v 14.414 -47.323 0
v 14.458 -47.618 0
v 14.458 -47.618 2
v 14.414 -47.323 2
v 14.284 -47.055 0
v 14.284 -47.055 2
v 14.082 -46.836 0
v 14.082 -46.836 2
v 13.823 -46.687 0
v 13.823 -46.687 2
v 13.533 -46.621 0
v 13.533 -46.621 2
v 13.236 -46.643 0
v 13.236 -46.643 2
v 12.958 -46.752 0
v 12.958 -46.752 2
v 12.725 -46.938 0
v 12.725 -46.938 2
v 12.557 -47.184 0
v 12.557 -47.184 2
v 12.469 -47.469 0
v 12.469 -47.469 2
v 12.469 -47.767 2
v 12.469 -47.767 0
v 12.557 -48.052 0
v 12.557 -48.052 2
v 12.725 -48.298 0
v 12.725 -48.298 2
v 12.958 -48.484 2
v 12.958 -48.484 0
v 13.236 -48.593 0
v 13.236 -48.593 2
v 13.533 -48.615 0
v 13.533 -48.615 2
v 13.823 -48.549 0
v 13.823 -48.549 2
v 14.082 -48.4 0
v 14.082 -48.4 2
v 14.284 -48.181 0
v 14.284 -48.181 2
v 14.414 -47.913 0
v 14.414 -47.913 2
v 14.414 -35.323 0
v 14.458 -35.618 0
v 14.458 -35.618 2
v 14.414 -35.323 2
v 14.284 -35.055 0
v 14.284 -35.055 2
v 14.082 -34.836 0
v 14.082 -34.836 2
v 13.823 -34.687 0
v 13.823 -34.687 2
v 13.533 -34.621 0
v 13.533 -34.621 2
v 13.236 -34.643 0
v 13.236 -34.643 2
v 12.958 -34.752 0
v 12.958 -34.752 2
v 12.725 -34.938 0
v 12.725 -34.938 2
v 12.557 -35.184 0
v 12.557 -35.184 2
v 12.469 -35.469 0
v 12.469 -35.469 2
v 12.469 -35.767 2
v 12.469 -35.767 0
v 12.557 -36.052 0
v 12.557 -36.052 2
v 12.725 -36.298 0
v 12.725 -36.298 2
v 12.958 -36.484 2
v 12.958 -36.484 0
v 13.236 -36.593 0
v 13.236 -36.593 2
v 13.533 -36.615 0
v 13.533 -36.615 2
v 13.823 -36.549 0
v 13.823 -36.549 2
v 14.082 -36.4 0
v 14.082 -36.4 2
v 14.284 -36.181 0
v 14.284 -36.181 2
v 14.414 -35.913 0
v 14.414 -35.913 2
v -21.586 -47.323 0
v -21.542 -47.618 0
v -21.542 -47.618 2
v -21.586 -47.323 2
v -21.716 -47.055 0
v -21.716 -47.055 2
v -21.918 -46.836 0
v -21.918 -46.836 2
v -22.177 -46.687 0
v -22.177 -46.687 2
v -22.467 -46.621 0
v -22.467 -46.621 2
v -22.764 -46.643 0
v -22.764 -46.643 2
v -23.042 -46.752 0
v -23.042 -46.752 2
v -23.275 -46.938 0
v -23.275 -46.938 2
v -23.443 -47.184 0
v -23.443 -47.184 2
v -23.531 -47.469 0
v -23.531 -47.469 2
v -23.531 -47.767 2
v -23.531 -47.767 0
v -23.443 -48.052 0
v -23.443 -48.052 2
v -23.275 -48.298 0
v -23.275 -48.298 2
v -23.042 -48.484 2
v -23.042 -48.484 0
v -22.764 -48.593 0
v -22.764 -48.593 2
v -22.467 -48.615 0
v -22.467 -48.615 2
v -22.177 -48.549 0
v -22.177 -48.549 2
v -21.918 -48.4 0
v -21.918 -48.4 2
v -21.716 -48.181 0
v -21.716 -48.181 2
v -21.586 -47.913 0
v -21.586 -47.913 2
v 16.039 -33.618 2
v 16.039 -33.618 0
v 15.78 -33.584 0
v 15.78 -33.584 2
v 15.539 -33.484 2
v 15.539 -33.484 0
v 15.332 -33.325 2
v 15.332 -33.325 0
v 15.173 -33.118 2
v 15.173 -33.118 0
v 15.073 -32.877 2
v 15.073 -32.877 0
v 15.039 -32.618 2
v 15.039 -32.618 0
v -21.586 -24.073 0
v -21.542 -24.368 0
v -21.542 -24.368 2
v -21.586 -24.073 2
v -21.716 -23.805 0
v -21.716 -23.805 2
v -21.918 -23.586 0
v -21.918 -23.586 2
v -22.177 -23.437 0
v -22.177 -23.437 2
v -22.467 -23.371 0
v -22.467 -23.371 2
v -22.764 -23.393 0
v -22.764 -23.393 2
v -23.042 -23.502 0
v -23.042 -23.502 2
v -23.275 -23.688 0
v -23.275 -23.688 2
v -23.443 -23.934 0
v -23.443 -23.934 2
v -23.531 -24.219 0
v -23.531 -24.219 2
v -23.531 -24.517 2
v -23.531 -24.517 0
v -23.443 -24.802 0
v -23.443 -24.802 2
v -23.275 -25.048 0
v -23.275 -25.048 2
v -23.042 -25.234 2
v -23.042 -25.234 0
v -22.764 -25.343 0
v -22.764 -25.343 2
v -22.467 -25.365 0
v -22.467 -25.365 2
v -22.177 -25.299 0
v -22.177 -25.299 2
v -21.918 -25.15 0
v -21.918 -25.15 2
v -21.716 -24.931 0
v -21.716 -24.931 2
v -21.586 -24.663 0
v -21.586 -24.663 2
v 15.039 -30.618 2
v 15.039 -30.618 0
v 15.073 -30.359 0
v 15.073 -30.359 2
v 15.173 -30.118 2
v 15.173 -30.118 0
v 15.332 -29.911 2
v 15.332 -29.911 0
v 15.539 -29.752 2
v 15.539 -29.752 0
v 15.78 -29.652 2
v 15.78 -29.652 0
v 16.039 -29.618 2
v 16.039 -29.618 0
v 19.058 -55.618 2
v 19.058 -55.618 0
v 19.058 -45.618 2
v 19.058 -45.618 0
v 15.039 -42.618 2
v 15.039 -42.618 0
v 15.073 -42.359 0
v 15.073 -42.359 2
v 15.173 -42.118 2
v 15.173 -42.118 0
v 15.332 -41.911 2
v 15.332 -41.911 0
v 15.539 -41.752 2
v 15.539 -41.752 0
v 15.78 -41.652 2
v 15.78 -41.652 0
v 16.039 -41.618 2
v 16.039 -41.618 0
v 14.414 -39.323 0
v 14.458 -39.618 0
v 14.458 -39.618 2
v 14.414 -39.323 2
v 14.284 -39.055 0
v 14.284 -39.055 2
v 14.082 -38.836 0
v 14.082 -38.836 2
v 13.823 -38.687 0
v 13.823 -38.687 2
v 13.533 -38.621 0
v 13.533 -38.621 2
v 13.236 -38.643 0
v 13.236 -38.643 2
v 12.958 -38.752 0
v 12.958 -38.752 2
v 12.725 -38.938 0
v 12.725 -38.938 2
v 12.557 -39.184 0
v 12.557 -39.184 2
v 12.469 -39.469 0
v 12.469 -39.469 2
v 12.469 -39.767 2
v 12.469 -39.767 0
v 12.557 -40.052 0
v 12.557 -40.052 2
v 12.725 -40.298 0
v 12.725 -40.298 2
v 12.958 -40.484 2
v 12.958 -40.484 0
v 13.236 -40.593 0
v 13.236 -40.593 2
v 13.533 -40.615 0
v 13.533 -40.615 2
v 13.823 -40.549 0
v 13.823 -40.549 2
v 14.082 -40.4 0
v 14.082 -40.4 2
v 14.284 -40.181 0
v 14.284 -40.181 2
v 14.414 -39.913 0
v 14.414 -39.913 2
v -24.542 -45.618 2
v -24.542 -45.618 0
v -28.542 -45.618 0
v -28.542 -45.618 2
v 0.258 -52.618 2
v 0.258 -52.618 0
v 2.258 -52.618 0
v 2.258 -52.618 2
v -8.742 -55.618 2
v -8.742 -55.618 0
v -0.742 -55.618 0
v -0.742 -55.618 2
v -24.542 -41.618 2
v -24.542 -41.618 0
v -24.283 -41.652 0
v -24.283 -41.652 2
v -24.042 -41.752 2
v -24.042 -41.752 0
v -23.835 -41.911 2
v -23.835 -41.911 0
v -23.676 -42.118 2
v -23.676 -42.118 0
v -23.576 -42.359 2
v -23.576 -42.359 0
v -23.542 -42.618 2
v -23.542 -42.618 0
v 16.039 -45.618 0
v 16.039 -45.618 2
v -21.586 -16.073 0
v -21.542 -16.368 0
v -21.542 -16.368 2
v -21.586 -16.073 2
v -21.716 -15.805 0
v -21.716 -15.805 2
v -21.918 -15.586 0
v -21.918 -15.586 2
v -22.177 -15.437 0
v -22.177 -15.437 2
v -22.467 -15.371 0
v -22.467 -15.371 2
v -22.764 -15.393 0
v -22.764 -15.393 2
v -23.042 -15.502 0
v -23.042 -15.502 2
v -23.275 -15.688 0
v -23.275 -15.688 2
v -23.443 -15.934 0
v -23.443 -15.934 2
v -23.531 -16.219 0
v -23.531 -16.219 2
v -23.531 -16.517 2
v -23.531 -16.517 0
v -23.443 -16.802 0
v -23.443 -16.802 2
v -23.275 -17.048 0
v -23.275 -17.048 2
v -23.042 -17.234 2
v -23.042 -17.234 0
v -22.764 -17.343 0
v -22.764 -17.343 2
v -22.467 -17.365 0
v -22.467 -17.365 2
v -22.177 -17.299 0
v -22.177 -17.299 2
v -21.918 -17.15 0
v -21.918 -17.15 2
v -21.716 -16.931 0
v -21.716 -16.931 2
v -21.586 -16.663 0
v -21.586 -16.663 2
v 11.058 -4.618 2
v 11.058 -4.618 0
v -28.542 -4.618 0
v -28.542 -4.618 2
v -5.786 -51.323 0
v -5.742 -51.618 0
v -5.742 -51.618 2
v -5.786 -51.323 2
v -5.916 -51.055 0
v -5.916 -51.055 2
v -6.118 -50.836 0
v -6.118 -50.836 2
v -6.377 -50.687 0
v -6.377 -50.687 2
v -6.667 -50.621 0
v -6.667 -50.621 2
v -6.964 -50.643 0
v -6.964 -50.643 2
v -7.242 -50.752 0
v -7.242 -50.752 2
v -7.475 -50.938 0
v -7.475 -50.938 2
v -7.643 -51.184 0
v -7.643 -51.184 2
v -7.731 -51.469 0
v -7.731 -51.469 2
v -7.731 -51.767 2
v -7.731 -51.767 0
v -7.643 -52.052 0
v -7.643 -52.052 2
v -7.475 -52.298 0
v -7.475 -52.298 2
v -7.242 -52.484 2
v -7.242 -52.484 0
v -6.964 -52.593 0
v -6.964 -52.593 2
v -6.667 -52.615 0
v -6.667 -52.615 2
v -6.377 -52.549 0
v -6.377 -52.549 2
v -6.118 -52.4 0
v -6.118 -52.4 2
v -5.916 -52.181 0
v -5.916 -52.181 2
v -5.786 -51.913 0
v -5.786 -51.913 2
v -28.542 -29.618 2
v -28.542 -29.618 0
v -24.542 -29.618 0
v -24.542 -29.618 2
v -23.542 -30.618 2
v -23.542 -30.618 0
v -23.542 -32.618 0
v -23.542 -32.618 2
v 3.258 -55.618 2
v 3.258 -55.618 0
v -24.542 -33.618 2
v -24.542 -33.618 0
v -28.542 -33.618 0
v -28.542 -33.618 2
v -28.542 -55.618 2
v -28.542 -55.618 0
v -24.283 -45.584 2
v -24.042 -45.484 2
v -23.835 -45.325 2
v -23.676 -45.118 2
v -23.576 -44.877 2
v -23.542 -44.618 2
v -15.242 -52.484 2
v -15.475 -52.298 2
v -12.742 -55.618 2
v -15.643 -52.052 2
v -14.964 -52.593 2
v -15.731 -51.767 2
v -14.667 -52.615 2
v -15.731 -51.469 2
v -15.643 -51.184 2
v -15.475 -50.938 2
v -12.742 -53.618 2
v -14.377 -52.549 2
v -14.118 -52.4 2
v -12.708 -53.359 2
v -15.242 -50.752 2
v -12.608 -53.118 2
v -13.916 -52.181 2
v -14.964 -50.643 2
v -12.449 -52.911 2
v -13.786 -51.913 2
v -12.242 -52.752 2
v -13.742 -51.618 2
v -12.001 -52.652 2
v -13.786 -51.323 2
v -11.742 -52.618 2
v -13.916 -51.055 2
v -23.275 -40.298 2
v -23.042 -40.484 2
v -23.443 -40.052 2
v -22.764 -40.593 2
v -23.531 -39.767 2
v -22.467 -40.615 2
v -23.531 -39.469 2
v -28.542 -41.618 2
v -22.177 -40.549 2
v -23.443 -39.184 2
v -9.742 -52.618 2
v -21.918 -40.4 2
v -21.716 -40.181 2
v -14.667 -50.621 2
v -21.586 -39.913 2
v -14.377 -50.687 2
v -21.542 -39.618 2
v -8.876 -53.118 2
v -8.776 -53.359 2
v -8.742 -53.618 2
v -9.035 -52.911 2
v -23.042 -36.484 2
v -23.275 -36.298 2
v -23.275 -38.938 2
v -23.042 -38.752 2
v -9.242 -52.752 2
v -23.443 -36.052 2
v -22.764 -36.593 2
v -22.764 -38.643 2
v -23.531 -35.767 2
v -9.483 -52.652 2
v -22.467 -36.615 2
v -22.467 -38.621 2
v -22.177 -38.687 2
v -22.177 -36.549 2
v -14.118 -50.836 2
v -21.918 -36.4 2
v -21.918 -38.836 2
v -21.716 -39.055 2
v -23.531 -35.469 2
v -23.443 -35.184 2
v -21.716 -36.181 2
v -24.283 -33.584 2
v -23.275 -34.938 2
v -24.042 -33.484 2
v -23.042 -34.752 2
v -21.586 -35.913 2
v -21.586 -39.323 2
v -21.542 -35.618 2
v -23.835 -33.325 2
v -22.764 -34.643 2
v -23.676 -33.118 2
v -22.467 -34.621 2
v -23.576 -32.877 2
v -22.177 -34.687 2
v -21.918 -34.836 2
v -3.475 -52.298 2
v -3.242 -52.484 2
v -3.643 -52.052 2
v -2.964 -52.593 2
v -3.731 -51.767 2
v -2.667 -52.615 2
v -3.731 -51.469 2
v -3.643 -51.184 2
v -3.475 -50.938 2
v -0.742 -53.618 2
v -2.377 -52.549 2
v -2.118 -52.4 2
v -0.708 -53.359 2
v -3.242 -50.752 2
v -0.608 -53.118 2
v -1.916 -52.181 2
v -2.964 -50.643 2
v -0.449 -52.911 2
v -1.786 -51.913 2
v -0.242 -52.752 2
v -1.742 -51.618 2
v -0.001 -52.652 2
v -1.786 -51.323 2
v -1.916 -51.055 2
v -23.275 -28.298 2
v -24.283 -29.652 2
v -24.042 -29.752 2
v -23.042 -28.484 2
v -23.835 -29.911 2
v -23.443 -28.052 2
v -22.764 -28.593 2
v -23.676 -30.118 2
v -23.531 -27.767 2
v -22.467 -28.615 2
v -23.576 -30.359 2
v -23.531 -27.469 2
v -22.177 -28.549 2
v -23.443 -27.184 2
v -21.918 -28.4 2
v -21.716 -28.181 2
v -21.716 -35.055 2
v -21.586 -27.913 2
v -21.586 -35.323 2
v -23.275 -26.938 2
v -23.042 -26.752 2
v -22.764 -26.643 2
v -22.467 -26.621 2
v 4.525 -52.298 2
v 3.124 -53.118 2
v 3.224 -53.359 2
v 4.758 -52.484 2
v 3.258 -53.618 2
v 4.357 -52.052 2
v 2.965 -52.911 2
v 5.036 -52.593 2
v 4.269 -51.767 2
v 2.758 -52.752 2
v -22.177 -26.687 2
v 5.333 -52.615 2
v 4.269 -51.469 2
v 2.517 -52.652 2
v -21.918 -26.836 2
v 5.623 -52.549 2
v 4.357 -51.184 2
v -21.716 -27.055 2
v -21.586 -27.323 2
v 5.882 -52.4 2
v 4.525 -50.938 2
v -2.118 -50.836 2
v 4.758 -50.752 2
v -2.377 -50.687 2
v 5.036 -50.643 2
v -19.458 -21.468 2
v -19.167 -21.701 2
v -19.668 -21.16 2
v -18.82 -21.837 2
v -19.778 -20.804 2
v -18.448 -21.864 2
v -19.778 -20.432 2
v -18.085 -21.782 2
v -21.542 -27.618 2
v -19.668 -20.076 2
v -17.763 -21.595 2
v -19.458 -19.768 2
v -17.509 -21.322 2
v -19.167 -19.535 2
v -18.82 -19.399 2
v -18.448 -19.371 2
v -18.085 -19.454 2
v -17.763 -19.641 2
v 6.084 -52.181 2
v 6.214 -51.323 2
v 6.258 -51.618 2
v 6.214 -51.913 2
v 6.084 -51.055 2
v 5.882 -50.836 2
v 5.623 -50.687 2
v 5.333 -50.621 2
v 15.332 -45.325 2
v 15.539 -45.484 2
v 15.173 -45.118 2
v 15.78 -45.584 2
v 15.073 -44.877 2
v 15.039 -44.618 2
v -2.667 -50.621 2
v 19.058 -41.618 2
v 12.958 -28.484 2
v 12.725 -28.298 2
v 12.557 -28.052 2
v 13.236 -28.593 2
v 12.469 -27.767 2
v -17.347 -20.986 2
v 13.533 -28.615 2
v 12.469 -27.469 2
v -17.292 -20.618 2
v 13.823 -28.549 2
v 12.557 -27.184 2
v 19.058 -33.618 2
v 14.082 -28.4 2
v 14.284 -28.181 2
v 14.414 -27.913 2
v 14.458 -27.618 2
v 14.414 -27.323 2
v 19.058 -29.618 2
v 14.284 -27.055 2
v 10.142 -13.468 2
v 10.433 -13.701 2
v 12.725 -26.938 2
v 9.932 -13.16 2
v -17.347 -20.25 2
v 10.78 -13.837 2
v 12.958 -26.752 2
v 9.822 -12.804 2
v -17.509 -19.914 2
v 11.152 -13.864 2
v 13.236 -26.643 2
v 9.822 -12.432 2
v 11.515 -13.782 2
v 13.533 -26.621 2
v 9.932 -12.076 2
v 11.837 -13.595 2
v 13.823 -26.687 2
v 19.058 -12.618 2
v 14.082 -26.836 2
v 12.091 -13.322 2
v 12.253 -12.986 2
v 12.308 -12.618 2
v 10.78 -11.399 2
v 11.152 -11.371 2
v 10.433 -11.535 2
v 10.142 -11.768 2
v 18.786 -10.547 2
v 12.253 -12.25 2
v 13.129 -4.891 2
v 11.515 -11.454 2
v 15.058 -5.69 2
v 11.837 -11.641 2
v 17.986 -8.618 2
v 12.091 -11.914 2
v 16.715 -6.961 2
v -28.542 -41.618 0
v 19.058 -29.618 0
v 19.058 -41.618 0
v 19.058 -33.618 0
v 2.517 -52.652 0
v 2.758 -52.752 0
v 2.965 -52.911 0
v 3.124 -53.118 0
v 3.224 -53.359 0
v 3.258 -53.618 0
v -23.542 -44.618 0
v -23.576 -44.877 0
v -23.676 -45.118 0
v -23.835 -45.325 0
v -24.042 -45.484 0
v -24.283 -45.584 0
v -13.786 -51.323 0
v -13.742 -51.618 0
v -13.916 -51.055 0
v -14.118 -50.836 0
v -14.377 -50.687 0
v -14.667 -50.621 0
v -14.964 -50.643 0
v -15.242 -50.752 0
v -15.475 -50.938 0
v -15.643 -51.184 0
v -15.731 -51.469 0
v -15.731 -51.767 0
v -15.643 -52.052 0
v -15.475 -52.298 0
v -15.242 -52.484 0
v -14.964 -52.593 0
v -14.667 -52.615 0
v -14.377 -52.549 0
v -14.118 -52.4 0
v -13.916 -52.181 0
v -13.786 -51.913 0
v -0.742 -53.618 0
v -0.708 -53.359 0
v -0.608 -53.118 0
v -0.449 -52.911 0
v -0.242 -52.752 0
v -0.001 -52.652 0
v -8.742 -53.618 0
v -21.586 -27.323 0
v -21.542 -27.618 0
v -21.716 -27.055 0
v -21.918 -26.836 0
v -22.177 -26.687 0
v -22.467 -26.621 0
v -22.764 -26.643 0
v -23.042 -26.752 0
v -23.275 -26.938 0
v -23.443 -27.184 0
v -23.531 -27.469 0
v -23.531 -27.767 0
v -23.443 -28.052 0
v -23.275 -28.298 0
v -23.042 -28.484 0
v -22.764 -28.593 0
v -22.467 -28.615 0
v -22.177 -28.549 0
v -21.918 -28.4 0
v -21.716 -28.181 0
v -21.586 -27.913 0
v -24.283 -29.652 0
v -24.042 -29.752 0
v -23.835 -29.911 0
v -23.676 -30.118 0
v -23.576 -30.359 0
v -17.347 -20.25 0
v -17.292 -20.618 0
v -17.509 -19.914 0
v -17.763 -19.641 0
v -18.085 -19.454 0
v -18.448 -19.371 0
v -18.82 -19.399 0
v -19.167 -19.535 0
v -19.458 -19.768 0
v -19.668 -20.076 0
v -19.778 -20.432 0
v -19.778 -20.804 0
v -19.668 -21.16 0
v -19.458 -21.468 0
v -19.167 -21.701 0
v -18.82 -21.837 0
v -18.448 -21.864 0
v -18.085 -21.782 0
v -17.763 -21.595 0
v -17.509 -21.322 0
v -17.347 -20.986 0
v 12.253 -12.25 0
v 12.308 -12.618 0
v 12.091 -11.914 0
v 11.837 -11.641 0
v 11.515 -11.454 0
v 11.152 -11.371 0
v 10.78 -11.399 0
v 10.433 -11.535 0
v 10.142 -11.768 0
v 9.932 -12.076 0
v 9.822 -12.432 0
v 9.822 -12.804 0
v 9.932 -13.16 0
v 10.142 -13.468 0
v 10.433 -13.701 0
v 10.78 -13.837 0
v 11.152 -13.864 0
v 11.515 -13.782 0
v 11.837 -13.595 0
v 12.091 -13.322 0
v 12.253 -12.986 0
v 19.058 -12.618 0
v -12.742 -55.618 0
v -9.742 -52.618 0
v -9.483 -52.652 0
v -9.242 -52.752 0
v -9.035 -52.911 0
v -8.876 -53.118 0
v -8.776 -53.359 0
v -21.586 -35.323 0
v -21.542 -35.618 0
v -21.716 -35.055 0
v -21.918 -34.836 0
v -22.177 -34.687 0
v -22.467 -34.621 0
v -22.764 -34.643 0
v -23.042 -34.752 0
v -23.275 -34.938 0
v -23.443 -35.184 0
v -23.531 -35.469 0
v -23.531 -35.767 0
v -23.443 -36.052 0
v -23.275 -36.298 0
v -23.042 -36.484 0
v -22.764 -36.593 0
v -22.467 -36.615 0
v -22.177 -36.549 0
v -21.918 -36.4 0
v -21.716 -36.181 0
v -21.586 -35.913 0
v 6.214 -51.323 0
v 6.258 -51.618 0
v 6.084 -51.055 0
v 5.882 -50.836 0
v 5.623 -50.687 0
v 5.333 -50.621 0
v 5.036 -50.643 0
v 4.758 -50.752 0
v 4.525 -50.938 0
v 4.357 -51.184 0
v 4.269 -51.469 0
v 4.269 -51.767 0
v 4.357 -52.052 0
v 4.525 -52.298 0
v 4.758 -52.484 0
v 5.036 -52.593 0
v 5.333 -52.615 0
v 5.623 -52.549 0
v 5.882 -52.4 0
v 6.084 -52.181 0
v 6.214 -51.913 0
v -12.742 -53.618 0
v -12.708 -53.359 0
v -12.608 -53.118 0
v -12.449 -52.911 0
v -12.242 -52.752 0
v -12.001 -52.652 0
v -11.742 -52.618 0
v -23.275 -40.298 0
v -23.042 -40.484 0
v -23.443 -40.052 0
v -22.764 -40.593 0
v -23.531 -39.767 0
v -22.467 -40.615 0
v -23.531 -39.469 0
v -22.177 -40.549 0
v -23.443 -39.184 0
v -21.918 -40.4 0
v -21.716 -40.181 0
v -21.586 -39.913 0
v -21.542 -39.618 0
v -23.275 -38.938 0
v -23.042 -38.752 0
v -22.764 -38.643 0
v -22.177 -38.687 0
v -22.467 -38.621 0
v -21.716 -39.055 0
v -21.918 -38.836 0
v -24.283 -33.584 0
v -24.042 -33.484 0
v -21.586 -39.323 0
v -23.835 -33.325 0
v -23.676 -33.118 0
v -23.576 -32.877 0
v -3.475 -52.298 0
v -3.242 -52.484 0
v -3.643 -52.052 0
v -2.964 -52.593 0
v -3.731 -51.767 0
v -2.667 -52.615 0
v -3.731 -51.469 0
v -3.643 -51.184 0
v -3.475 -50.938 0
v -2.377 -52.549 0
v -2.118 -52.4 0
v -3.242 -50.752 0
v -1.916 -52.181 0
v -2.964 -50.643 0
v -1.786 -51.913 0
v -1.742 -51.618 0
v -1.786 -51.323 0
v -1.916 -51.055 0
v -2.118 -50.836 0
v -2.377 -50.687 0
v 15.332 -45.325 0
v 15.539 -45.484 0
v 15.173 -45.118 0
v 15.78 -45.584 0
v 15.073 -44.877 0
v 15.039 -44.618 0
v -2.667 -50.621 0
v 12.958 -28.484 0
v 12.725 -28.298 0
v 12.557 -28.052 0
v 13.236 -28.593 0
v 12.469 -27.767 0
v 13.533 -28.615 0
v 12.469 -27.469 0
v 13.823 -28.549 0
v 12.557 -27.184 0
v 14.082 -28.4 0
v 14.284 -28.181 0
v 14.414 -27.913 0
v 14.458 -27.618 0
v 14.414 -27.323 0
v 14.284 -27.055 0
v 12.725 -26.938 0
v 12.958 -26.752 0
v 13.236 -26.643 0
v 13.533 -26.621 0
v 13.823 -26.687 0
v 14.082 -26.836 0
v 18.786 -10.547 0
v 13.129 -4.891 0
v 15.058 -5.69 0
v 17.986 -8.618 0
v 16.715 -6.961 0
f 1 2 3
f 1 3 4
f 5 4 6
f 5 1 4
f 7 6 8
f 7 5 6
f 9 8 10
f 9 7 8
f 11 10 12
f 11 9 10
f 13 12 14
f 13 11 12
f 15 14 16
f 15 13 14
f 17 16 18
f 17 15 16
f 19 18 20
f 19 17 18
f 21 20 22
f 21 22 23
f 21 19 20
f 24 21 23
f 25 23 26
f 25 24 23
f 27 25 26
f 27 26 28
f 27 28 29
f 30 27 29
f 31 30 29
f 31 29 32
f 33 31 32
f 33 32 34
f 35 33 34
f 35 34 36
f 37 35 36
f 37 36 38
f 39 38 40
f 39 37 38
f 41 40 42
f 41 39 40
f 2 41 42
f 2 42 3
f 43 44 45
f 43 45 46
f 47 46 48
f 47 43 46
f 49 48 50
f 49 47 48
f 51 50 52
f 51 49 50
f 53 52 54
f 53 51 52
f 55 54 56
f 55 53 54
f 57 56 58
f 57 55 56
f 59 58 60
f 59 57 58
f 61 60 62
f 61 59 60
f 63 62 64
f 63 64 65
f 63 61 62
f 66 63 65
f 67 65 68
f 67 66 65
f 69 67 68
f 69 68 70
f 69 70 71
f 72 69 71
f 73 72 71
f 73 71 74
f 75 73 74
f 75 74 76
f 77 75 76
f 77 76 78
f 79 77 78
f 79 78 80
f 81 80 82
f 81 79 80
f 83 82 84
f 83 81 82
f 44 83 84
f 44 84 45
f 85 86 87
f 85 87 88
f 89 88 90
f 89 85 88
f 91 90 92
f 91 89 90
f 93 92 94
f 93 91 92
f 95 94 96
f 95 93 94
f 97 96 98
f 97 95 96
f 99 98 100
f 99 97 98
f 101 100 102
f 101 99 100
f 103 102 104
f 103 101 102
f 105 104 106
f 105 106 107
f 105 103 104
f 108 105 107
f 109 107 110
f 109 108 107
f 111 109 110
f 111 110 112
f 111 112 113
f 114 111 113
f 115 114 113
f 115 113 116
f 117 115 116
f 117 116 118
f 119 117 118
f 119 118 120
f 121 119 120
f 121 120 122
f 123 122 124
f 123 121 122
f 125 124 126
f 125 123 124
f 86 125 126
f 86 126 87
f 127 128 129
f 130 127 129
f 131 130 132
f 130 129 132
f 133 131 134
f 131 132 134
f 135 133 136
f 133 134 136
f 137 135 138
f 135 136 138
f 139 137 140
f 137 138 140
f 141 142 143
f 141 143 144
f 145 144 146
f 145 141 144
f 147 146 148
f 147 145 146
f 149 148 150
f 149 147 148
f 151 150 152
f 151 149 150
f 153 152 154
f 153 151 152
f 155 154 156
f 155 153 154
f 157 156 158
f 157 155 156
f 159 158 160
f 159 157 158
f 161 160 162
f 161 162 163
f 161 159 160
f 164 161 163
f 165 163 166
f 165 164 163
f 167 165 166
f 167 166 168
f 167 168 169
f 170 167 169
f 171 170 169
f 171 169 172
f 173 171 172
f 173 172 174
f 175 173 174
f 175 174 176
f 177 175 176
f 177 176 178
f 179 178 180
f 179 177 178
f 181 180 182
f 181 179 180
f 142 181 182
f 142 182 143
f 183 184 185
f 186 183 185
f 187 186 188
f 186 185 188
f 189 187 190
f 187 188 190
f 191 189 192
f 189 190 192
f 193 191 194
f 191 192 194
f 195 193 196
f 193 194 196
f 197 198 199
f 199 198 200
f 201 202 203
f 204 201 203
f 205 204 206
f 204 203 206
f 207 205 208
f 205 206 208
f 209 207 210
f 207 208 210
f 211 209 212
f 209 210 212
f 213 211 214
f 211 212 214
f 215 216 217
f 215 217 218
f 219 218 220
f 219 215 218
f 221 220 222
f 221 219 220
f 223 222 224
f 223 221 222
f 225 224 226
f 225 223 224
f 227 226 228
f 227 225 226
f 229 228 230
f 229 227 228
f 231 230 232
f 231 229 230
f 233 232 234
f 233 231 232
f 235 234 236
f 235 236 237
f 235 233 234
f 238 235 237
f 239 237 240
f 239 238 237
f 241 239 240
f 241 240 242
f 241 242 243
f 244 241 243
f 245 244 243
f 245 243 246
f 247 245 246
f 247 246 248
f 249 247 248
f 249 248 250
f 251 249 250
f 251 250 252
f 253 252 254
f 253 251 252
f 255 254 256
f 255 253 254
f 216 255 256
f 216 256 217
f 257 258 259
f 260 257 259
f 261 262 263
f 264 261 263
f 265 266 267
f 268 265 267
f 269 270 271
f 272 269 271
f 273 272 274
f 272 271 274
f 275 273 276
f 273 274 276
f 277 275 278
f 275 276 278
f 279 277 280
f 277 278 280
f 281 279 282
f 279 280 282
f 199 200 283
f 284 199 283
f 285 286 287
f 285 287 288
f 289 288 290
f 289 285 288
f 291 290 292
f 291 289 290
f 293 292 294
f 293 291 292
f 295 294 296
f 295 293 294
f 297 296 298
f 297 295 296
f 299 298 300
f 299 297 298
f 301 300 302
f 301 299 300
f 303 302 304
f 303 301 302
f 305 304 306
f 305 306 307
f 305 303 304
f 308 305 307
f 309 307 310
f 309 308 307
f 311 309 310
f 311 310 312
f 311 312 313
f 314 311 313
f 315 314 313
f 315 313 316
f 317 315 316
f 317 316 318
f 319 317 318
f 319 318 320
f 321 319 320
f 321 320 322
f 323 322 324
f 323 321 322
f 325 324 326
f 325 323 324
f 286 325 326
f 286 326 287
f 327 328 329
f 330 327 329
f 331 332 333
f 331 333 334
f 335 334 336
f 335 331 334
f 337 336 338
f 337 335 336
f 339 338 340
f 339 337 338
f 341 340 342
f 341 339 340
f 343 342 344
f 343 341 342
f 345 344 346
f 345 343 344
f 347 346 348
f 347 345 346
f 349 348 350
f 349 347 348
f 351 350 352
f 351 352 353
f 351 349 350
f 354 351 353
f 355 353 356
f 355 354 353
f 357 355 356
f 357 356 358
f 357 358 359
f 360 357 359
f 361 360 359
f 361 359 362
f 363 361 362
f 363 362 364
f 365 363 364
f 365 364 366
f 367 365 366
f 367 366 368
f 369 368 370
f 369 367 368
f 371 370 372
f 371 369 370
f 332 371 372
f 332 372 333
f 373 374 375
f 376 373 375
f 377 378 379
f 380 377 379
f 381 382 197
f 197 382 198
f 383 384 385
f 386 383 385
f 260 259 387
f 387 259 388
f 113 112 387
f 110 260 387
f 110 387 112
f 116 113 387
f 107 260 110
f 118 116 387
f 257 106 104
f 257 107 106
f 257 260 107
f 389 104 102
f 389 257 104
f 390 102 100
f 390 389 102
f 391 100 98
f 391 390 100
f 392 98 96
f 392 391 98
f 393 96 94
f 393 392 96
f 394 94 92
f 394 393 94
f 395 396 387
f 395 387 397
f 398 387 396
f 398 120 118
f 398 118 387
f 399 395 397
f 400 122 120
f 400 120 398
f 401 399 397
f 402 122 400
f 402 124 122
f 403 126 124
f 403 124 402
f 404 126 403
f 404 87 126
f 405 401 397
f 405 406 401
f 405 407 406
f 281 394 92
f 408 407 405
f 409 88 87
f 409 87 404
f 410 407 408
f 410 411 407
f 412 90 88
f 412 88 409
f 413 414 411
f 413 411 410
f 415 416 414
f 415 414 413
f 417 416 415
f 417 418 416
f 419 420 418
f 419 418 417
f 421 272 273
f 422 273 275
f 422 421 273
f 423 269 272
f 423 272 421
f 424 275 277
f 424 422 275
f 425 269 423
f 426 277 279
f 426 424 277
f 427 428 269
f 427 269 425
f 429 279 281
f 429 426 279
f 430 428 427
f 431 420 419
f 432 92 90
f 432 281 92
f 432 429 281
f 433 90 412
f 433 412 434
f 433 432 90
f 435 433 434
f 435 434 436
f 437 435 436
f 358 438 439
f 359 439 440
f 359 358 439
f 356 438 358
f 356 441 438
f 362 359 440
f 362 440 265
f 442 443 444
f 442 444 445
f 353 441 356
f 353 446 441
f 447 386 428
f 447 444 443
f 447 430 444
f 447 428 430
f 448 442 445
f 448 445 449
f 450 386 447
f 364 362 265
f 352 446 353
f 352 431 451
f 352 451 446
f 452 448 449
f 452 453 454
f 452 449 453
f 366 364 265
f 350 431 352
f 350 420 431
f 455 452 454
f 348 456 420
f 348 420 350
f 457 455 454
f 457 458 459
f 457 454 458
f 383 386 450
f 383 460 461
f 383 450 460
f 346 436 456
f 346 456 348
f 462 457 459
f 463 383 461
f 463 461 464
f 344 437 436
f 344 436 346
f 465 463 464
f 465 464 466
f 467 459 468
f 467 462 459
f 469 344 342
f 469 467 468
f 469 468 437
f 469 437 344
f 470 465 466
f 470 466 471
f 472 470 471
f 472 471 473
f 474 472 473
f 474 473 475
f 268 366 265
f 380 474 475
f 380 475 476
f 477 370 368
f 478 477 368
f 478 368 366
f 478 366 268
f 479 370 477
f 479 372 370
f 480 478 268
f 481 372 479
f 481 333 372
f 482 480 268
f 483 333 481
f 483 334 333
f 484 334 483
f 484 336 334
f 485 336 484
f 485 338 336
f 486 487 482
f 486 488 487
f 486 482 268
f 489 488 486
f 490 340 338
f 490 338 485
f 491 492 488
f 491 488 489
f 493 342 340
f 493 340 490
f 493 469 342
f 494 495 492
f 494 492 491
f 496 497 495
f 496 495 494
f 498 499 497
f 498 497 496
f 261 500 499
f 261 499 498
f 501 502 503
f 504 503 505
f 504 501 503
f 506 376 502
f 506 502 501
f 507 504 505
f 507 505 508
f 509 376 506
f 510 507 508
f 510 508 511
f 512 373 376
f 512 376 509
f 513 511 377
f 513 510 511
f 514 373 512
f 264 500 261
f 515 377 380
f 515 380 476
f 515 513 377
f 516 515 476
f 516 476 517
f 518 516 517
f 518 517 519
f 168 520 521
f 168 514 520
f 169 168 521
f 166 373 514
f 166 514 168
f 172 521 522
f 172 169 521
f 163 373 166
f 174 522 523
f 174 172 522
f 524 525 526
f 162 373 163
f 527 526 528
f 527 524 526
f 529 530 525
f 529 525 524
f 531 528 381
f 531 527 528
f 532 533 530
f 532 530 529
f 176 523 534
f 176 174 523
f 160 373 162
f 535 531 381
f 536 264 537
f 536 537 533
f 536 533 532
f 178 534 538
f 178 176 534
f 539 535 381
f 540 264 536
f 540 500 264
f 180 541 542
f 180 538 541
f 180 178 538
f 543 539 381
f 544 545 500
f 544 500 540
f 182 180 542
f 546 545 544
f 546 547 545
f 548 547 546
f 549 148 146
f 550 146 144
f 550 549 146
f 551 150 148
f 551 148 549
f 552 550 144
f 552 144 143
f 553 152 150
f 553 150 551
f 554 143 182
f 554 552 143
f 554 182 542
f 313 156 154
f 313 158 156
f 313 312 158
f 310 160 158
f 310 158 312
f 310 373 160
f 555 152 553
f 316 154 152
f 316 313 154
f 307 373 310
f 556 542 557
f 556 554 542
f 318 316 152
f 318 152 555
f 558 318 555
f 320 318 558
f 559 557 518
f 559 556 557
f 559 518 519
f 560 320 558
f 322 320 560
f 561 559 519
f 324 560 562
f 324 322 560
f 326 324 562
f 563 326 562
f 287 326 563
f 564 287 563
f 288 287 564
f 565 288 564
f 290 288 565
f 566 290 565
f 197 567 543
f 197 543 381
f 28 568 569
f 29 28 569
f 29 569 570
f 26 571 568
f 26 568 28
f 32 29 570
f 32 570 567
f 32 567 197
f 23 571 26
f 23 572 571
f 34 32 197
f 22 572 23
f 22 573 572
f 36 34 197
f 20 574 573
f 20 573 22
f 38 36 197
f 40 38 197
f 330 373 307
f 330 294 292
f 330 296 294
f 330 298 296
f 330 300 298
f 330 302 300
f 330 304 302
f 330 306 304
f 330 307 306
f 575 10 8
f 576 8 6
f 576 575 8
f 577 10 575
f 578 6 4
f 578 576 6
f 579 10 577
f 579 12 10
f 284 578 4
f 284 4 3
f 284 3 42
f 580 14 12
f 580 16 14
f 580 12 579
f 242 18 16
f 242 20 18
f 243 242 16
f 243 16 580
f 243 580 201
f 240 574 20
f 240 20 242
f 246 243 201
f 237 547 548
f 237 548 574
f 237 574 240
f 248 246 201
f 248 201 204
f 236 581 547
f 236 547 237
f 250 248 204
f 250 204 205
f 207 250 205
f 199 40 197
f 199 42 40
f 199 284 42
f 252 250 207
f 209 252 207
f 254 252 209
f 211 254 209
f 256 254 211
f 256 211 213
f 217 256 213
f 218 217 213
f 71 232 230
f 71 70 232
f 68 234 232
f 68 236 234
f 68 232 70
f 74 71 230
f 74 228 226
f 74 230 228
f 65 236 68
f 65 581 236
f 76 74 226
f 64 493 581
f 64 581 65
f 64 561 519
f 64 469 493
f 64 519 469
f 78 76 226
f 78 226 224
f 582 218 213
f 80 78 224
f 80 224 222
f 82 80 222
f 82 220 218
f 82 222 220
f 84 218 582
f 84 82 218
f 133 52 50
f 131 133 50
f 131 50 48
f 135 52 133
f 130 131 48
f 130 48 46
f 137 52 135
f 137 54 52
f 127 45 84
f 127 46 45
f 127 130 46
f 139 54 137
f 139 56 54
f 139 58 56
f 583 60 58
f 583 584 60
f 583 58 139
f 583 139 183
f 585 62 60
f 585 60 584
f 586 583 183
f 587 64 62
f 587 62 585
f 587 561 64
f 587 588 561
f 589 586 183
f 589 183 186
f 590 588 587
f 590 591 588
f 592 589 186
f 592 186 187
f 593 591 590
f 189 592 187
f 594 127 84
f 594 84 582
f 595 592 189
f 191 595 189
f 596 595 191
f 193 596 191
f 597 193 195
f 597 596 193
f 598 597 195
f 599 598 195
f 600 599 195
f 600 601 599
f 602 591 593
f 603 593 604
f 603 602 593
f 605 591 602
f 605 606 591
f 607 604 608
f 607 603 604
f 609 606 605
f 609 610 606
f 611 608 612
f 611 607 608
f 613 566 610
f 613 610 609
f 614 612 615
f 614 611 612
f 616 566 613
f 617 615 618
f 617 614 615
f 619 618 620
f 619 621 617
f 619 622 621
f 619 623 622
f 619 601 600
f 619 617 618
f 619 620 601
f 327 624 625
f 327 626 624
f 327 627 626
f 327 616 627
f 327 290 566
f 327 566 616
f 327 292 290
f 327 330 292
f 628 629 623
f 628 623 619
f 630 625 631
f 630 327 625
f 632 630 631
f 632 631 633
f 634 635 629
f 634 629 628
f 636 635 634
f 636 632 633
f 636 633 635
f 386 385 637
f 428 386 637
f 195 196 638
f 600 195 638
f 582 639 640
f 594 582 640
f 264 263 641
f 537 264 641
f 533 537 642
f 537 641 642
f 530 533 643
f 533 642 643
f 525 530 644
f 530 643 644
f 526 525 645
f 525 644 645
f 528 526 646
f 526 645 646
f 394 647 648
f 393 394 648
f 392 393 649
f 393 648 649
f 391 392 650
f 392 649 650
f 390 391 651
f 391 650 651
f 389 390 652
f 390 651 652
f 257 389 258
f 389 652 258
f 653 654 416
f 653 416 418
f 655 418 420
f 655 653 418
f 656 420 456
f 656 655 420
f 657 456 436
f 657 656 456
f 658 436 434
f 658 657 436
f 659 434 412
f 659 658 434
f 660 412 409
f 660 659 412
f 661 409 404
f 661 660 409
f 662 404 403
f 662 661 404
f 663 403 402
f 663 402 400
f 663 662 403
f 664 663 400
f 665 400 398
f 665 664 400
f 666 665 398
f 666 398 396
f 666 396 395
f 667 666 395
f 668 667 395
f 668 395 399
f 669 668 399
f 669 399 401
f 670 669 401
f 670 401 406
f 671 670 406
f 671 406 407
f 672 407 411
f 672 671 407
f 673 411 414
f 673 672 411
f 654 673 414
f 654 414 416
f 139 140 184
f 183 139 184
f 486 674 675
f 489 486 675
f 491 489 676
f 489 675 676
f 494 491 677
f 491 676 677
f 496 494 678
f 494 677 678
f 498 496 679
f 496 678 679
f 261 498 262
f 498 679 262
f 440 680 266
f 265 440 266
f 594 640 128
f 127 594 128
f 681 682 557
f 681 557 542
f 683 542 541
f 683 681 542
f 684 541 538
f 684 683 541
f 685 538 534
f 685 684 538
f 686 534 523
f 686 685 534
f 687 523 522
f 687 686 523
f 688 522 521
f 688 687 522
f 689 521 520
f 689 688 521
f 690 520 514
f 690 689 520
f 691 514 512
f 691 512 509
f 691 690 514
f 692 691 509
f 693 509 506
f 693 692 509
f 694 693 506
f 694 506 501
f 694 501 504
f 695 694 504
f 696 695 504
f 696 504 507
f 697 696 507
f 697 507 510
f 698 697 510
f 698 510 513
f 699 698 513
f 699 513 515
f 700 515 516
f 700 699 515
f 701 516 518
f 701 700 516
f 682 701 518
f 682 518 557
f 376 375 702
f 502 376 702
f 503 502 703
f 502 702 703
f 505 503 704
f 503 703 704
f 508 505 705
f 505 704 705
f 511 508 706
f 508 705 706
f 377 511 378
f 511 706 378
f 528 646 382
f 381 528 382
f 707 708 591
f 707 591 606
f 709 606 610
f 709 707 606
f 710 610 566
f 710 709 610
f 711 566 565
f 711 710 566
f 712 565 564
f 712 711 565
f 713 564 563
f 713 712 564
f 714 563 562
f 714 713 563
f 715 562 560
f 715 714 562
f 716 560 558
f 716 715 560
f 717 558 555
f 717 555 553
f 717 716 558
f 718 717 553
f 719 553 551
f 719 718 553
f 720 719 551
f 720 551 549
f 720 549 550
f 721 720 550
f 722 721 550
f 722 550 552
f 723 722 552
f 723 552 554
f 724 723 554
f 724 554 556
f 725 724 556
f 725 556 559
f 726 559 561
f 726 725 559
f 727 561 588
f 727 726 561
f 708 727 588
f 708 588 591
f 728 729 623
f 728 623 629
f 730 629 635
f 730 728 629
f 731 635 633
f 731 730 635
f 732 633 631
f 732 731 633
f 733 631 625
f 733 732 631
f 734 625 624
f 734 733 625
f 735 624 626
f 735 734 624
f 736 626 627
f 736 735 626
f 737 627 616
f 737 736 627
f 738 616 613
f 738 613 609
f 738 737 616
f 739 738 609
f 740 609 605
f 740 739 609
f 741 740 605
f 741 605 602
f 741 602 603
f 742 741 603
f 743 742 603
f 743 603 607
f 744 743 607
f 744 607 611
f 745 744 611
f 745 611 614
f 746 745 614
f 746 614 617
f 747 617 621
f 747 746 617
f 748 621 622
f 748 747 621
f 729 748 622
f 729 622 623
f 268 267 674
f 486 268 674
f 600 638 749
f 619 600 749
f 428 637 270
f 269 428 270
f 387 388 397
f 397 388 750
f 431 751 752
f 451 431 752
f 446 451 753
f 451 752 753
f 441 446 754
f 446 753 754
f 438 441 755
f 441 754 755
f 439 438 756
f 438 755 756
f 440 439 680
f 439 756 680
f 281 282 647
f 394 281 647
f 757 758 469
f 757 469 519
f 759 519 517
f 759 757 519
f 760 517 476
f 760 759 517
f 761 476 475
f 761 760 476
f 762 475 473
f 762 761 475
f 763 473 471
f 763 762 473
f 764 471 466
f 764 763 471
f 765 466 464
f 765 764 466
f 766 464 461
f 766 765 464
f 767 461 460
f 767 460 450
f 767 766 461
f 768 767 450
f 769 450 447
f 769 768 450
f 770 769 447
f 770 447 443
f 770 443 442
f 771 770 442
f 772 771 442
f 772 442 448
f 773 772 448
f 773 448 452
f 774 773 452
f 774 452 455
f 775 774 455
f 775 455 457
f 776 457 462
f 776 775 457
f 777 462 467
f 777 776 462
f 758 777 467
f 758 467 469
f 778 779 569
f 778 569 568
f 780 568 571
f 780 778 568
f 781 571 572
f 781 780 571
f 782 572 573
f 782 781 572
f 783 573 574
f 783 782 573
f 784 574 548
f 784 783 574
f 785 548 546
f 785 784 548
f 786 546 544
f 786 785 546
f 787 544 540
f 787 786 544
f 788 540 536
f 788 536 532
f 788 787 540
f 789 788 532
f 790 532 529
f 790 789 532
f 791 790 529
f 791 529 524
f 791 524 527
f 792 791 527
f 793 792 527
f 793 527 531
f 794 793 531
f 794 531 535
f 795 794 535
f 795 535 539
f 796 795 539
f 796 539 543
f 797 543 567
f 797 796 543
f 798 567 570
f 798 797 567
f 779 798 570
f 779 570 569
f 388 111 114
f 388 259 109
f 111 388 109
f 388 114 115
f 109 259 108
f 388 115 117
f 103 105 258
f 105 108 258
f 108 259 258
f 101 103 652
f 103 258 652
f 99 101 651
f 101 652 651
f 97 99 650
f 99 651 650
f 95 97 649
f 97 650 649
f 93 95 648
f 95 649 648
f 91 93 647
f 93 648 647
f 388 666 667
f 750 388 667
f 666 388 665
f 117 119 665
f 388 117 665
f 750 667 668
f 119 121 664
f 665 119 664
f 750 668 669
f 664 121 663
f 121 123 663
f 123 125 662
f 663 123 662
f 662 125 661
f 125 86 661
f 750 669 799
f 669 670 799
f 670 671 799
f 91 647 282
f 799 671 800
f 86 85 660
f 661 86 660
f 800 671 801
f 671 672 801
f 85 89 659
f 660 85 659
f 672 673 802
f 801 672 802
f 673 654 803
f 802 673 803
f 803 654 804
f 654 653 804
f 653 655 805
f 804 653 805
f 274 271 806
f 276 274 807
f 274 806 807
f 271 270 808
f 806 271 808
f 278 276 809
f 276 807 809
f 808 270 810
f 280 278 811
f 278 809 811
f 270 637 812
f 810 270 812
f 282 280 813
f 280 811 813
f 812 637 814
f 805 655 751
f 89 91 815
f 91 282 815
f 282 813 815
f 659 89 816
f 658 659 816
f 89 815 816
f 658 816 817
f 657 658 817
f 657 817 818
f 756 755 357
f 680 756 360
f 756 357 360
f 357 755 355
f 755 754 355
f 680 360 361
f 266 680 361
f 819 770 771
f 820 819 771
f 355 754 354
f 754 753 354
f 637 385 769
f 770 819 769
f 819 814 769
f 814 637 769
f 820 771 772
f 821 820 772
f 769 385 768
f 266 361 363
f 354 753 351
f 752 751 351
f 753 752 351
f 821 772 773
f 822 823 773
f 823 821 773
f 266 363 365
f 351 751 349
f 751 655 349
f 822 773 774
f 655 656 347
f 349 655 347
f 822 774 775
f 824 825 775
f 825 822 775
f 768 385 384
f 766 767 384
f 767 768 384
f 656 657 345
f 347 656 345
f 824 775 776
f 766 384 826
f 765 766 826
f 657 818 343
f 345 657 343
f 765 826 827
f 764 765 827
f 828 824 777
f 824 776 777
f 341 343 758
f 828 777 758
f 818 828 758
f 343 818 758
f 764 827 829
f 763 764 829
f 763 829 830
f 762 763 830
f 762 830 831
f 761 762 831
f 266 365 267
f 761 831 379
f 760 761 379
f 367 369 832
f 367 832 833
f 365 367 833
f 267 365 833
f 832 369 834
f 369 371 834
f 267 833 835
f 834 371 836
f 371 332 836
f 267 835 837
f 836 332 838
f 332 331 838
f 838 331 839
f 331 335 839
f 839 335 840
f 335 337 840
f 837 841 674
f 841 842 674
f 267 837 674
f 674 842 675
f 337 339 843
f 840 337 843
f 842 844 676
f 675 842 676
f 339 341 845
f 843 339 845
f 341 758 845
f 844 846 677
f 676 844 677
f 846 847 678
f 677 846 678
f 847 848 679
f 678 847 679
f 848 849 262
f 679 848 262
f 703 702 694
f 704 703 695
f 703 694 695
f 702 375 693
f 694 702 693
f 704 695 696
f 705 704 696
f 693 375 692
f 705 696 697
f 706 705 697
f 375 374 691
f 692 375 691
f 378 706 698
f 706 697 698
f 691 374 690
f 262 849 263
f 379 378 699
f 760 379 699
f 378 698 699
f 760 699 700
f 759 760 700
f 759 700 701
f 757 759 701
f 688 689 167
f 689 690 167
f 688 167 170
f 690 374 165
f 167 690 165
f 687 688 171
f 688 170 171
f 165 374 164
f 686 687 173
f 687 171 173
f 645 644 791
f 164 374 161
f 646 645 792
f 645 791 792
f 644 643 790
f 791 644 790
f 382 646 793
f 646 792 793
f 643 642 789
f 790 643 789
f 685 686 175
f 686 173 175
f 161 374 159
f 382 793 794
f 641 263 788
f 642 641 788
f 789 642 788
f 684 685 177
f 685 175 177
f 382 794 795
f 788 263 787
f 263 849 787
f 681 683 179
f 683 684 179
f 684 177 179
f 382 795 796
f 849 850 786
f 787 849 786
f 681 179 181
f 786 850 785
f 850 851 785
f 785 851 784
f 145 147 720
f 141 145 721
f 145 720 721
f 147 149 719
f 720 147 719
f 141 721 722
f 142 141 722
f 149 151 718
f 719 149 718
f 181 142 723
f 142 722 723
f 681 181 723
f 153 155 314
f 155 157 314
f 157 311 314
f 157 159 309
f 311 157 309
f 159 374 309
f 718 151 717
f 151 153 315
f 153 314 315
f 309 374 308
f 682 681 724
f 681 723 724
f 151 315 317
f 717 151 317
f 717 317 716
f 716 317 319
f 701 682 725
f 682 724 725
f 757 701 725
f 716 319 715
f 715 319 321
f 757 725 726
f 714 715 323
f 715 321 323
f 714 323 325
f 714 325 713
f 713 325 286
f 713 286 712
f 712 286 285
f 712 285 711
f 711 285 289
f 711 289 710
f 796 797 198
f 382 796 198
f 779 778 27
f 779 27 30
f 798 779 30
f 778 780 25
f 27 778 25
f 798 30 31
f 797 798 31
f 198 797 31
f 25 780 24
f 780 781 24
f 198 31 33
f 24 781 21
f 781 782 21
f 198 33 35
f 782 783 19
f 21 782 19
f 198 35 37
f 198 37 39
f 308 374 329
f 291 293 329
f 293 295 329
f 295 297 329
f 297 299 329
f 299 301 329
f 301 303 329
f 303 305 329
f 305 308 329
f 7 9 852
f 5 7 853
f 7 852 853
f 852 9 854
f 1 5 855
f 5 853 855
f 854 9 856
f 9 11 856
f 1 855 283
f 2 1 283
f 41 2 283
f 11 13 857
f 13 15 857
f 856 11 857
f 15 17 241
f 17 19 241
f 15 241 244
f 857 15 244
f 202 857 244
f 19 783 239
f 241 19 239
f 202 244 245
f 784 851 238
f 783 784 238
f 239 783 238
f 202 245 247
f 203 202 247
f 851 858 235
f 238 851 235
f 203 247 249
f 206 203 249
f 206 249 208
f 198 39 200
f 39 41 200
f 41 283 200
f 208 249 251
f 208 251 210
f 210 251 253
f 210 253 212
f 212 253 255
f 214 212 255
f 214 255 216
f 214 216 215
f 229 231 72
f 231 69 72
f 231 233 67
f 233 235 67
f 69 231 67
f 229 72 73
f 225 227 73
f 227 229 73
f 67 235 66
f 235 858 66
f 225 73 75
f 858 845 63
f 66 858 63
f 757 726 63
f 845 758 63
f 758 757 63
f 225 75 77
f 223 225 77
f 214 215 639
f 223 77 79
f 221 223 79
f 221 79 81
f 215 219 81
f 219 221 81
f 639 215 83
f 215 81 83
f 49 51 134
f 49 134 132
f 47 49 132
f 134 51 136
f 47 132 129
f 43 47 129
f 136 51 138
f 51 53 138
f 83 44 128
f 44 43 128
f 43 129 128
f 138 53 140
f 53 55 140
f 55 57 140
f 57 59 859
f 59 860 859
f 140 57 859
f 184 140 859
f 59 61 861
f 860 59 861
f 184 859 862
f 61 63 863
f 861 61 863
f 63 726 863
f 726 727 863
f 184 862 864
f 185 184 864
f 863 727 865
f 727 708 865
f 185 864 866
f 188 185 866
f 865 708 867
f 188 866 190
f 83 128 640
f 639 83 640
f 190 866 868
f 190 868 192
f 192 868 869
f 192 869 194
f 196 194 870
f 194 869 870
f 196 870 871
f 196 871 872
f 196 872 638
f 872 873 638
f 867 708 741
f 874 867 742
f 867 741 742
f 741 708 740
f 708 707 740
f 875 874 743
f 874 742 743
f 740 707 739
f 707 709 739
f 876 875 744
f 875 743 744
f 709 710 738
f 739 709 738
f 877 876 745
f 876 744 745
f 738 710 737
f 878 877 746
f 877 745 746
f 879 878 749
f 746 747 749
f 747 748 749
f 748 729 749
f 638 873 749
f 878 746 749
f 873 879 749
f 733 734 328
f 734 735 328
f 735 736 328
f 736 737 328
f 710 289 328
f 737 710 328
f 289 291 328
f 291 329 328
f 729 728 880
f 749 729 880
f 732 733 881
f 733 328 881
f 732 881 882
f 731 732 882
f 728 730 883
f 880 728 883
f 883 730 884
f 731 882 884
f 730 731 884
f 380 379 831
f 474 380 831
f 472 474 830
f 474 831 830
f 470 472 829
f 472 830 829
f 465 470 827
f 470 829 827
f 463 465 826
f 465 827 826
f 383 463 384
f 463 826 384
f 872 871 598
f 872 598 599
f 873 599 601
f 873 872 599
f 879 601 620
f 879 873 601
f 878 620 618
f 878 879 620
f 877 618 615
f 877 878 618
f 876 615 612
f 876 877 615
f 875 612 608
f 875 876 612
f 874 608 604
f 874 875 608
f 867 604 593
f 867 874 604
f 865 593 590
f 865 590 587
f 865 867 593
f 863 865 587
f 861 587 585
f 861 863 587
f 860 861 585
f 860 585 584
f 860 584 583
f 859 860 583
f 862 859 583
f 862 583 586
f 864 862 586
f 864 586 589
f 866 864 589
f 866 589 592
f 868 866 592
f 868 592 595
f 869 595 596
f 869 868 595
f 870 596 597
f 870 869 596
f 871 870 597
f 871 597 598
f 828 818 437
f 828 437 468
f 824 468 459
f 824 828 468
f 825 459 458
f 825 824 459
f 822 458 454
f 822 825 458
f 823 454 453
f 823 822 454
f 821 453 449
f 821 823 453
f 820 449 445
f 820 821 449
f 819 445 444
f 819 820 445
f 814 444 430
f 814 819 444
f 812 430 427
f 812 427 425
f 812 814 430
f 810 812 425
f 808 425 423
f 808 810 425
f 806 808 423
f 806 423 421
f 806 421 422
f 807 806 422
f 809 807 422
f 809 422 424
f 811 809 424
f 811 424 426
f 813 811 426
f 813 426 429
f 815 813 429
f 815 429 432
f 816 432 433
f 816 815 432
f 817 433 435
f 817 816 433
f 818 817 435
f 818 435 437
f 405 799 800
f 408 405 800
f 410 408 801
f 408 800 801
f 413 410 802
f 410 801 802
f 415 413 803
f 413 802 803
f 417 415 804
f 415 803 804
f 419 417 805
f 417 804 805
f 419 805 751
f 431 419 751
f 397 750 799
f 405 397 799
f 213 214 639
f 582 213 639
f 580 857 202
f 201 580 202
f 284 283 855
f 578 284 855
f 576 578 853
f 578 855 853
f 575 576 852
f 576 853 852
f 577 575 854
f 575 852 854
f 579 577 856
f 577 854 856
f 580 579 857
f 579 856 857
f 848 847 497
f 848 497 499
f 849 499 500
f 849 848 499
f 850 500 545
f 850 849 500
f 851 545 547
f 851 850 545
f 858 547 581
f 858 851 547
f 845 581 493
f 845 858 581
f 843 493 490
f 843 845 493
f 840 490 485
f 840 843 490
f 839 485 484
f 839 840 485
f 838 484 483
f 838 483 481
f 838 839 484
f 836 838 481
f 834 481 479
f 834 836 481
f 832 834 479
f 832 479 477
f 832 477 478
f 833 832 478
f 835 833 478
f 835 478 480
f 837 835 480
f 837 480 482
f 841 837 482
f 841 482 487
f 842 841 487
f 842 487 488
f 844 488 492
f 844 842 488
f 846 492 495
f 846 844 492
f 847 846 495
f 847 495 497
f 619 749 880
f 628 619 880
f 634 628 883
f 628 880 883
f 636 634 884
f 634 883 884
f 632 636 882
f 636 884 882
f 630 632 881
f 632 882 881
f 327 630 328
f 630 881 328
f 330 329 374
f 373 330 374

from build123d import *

# Parameters (mm, degrees)
SKETCH_1_R      = 1.25
SKETCH_1_R_2    = 1
EXTRUDE_2_DEPTH = 2


with BuildPart() as part:
    # 草圖1 → 填料-伸長2 (new body)
    with BuildSketch(Plane.XY):
        with BuildLine():
            Line((19.058094933, -28.1179941), (19.058094933, -12.6179941))
            ThreePointArc((19.058094933, -12.6179941), (16.714949182, -6.961139851), (11.058094933, -4.6179941))
            Line((11.058094933, -4.6179941), (-7.541905067, -4.6179941))
            Line((-7.541905067, -4.6179941), (-27.541905067, -4.6179941))
            Line((-27.541905067, -4.6179941), (-28.541905067, -4.6179941))
            Line((-28.541905067, -4.6179941), (-28.541905067, -5.6179941))
            Line((-28.541905067, -5.6179941), (-28.541905067, -12.6179941))
            Line((-28.541905067, -12.6179941), (-28.541905067, -28.1179941))
            Line((-28.541905067, -28.1179941), (-28.541905067, -29.6179941))
            Line((-28.541905067, -29.6179941), (-26.541905067, -29.6179941))
            Line((-26.541905067, -29.6179941), (-24.541905067, -29.6179941))
            ThreePointArc((-24.541905067, -29.6179941), (-23.834798286, -29.910887319), (-23.541905067, -30.6179941))
            Line((-23.541905067, -30.6179941), (-23.541905067, -32.6179941))
            ThreePointArc((-23.541905067, -32.6179941), (-23.834798286, -33.325100881), (-24.541905067, -33.6179941))
            Line((-24.541905067, -33.6179941), (-26.541905067, -33.6179941))
            Line((-26.541905067, -33.6179941), (-28.541905067, -33.6179941))
            Line((-28.541905067, -33.6179941), (-28.541905067, -41.6179941))
            Line((-28.541905067, -41.6179941), (-26.541905067, -41.6179941))
            Line((-26.541905067, -41.6179941), (-24.541905067, -41.6179941))
            ThreePointArc((-24.541905067, -41.6179941), (-23.834798286, -41.910887319), (-23.541905067, -42.6179941))
            Line((-23.541905067, -42.6179941), (-23.541905067, -44.6179941))
            ThreePointArc((-23.541905067, -44.6179941), (-23.834798286, -45.325100881), (-24.541905067, -45.6179941))
            Line((-24.541905067, -45.6179941), (-26.541905067, -45.6179941))
            Line((-26.541905067, -45.6179941), (-28.541905067, -45.6179941))
            Line((-28.541905067, -45.6179941), (-28.541905067, -52.6179941))
            Line((-28.541905067, -52.6179941), (-28.541905067, -53.6179941))
            Line((-28.541905067, -53.6179941), (-28.541905067, -55.6179941))
            Line((-28.541905067, -55.6179941), (-12.741905067, -55.6179941))
            Line((-12.741905067, -55.6179941), (-12.741905067, -53.6179941))
            ThreePointArc((-12.741905067, -53.6179941), (-12.449011848, -52.910887319), (-11.741905067, -52.6179941))
            Line((-11.741905067, -52.6179941), (-9.741905067, -52.6179941))
            ThreePointArc((-9.741905067, -52.6179941), (-9.034798286, -52.910887319), (-8.741905067, -53.6179941))
            Line((-8.741905067, -53.6179941), (-8.741905067, -55.6179941))
            Line((-8.741905067, -55.6179941), (-0.741905067, -55.6179941))
            Line((-0.741905067, -55.6179941), (-0.741905067, -53.6179941))
            ThreePointArc((-0.741905067, -53.6179941), (-0.449011848, -52.910887319), (0.258094933, -52.6179941))
            Line((0.258094933, -52.6179941), (2.258094933, -52.6179941))
            ThreePointArc((2.258094933, -52.6179941), (2.965201714, -52.910887319), (3.258094933, -53.6179941))
            Line((3.258094933, -53.6179941), (3.258094933, -55.6179941))
            Line((3.258094933, -55.6179941), (19.058094933, -55.6179941))
            Line((19.058094933, -55.6179941), (19.058094933, -53.6179941))
            Line((19.058094933, -53.6179941), (19.058094933, -52.6179941))
            Line((19.058094933, -52.6179941), (19.058094933, -45.6179941))
            Line((19.058094933, -45.6179941), (18.039175344, -45.6179941))
            Line((18.039175344, -45.6179941), (16.039175344, -45.6179941))
            ThreePointArc((16.039175344, -45.6179941), (15.332068562, -45.325100881), (15.039175344, -44.6179941))
            Line((15.039175344, -44.6179941), (15.039175344, -42.6179941))
            ThreePointArc((15.039175344, -42.6179941), (15.332068562, -41.910887319), (16.039175344, -41.6179941))
            Line((16.039175344, -41.6179941), (18.039175344, -41.6179941))
            Line((18.039175344, -41.6179941), (19.058094933, -41.6179941))
            Line((19.058094933, -41.6179941), (19.058094933, -33.6179941))
            Line((19.058094933, -33.6179941), (18.039175344, -33.6179941))
            Line((18.039175344, -33.6179941), (16.039175344, -33.6179941))
            ThreePointArc((16.039175344, -33.6179941), (15.332068562, -33.325100881), (15.039175344, -32.6179941))
            Line((15.039175344, -32.6179941), (15.039175344, -30.6179941))
            ThreePointArc((15.039175344, -30.6179941), (15.332068562, -29.910887319), (16.039175344, -29.6179941))
            Line((16.039175344, -29.6179941), (18.039175344, -29.6179941))
            Line((18.039175344, -29.6179941), (19.058094933, -29.6179941))
            Line((19.058094933, -29.6179941), (19.058094933, -28.1179941))
        make_face()
        with Locations((-18.541905067, -20.6179941)):
            Circle(SKETCH_1_R, mode=Mode.SUBTRACT)
        with Locations((-6.741905067, -51.6179941)):
            Circle(SKETCH_1_R_2, mode=Mode.SUBTRACT)
        with Locations((-14.741905067, -51.6179941)):
            Circle(SKETCH_1_R_2, mode=Mode.SUBTRACT)
        with Locations((5.258094933, -51.6179941)):
            Circle(SKETCH_1_R_2, mode=Mode.SUBTRACT)
        with Locations((-22.541905067, -16.3679941)):
            Circle(SKETCH_1_R_2, mode=Mode.SUBTRACT)
        with Locations((-22.541905067, -24.3679941)):
            Circle(SKETCH_1_R_2, mode=Mode.SUBTRACT)
        with Locations((13.458094933, -39.6179941)):
            Circle(SKETCH_1_R_2, mode=Mode.SUBTRACT)
        with Locations((13.458094933, -47.6179941)):
            Circle(SKETCH_1_R_2, mode=Mode.SUBTRACT)
        with Locations((11.058094933, -12.6179941)):
            Circle(SKETCH_1_R, mode=Mode.SUBTRACT)
        with Locations((-22.541905067, -27.6179941)):
            Circle(SKETCH_1_R_2, mode=Mode.SUBTRACT)
        with Locations((-22.541905067, -35.6179941)):
            Circle(SKETCH_1_R_2, mode=Mode.SUBTRACT)
        with Locations((-2.741905067, -51.6179941)):
            Circle(SKETCH_1_R_2, mode=Mode.SUBTRACT)
        with Locations((-22.541905067, -39.6179941)):
            Circle(SKETCH_1_R_2, mode=Mode.SUBTRACT)
        with Locations((-22.541905067, -47.6179941)):
            Circle(SKETCH_1_R_2, mode=Mode.SUBTRACT)
        with Locations((13.458094933, -27.6179941)):
            Circle(SKETCH_1_R_2, mode=Mode.SUBTRACT)
        with Locations((13.458094933, -35.6179941)):
            Circle(SKETCH_1_R_2, mode=Mode.SUBTRACT)
    extrude(amount=EXTRUDE_2_DEPTH)


solid = part.part
